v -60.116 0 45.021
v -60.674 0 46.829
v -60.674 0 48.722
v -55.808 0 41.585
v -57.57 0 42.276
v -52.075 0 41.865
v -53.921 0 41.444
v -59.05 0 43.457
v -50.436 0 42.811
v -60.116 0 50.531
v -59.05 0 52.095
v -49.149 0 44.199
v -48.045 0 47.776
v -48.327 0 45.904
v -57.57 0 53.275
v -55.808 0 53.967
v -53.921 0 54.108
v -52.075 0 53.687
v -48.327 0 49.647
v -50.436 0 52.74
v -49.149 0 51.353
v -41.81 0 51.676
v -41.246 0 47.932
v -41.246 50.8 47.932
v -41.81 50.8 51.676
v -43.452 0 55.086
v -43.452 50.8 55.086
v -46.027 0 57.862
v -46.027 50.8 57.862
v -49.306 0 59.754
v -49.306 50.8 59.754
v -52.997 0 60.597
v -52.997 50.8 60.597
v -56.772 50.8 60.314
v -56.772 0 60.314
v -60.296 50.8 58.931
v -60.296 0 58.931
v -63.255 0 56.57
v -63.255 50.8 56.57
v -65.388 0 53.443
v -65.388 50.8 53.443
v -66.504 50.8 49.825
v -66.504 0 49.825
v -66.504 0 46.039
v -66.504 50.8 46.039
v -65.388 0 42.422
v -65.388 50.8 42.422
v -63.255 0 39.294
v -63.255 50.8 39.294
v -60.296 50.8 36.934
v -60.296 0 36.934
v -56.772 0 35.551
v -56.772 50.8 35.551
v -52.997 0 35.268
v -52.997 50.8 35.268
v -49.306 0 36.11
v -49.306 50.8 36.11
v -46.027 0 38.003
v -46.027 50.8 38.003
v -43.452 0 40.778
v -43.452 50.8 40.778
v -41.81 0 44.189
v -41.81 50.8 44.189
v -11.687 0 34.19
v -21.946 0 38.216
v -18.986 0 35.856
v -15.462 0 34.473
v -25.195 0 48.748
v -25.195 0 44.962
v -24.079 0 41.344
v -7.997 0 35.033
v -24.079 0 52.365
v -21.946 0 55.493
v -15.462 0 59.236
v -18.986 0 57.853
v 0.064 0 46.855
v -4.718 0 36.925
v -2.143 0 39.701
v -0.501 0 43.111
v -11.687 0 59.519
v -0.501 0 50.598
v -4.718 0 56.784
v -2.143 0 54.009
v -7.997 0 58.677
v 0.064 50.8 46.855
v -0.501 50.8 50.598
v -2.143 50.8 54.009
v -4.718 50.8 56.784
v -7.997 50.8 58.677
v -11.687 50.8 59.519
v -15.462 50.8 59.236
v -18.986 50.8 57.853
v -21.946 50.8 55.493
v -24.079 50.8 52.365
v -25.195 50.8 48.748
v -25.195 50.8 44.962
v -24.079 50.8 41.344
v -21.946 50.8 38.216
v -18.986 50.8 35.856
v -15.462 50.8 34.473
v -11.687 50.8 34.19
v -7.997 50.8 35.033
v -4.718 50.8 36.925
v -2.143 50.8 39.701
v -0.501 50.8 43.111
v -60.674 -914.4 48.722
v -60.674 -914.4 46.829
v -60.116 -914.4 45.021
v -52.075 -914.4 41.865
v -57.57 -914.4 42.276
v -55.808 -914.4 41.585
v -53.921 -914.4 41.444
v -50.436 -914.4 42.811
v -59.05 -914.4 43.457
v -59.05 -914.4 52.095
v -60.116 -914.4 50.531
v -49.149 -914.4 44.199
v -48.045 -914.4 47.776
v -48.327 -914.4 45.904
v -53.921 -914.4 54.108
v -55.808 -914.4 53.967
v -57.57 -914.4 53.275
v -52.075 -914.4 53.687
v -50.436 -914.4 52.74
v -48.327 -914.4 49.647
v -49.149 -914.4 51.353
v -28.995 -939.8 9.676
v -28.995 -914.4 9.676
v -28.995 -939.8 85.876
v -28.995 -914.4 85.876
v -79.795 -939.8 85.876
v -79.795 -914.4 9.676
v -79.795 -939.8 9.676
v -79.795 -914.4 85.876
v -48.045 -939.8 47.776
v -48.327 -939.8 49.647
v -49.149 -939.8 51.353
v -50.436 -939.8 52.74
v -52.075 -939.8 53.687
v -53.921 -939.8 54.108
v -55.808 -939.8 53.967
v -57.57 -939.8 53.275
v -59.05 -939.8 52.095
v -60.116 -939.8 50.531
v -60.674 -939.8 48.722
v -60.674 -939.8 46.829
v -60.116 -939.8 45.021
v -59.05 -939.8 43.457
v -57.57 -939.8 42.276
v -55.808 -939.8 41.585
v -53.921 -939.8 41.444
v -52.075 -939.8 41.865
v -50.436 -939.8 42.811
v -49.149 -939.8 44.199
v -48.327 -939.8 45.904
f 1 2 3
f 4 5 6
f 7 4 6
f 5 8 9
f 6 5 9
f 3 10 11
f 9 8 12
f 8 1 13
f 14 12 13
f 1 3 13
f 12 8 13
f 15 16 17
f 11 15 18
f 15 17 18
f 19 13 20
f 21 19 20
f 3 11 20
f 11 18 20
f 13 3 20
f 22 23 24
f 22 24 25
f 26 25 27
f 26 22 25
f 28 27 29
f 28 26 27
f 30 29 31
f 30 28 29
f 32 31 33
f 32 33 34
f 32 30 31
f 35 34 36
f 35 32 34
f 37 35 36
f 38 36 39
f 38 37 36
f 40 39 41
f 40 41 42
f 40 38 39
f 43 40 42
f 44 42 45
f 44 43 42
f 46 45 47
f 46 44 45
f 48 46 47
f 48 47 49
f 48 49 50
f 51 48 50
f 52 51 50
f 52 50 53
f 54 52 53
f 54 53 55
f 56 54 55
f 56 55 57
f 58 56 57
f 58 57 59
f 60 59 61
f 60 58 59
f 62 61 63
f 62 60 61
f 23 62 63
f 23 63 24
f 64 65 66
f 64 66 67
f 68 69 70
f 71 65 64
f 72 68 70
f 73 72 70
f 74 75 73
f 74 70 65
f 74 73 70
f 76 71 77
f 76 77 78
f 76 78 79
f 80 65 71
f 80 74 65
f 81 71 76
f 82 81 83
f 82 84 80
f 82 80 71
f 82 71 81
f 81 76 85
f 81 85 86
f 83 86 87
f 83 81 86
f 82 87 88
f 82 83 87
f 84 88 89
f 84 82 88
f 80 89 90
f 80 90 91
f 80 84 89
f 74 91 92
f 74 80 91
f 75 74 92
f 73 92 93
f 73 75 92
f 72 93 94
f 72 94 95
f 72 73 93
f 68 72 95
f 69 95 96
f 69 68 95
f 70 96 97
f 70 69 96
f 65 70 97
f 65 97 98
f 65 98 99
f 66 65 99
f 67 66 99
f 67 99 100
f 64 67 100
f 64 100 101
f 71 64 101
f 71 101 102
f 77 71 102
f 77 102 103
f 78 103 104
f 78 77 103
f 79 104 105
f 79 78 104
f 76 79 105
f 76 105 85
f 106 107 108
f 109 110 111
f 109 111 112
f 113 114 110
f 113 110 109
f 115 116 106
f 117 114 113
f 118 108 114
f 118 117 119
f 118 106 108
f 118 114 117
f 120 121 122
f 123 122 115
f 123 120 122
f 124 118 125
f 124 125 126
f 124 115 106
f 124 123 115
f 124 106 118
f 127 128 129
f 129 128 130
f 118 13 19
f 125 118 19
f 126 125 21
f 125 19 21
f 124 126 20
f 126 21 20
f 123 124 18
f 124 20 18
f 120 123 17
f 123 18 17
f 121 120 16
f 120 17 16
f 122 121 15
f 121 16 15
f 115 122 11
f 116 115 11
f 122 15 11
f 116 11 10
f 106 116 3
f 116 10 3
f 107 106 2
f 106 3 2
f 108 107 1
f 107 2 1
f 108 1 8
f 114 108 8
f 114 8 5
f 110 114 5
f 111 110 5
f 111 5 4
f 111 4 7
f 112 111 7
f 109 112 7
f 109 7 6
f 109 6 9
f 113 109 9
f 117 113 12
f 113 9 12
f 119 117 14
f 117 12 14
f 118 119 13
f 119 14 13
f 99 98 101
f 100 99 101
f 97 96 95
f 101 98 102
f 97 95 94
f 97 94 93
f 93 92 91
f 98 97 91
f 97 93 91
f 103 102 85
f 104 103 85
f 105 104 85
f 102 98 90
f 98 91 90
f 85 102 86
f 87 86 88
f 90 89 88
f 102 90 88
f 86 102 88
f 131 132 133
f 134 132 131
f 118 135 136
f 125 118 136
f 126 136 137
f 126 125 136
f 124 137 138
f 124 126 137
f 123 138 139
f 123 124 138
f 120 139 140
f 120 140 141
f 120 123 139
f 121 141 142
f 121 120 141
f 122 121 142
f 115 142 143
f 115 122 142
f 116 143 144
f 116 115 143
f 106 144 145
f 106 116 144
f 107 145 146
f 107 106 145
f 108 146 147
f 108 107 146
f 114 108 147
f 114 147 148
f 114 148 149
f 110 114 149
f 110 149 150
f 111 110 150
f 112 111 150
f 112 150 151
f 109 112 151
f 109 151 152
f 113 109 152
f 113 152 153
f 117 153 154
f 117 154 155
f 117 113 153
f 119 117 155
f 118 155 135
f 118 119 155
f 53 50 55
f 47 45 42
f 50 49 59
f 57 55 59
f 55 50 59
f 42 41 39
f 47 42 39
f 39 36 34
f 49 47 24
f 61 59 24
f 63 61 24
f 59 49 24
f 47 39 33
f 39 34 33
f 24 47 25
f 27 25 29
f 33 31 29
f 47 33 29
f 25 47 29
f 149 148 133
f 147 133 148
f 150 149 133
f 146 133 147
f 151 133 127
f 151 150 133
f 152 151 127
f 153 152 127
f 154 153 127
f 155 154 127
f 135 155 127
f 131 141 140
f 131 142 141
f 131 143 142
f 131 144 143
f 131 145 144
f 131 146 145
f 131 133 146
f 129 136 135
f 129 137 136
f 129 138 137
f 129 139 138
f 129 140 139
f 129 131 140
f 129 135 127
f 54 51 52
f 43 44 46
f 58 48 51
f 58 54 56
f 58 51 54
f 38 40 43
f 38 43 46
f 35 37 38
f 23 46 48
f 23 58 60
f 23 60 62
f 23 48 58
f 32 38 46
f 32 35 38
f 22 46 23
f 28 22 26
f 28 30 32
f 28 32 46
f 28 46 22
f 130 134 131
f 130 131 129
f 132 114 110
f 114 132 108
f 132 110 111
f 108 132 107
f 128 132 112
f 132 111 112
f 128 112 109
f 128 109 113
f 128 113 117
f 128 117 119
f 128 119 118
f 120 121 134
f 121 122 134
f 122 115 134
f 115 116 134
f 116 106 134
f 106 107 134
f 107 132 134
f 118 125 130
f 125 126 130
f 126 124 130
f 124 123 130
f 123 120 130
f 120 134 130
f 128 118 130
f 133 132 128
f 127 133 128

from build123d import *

# Parameters (mm, degrees)
F0_R     = 12.7
F1_DEPTH = 50.8
F2_R     = 6.35
F3_DEPTH = 914.4
F4_W     = 50.8
F4_H     = 76.2
F4_R     = 6.35
F5_DEPTH = 25.4


with BuildPart() as f1:
    # F0 (on Front) → F1 (new body)
    with BuildSketch(Plane.XZ):
        with Locations((-53.9455996944, 47.9323024082)):
            Circle(F0_R)
    extrude(amount=-F1_DEPTH)


with BuildPart() as f1b:
    # F0 (on Front) → F1, piece 2 (new body)
    with BuildSketch(Plane.XZ):
        with Locations((-12.6364087513, 46.8546705113)):
            Circle(F0_R)
    extrude(amount=-F1_DEPTH)


with BuildPart() as f3:
    # F2 (on Front) → F3 (new body)
    with BuildSketch(Plane.XZ):
        with Locations((-54.395288229, 47.7757565677)):
            Circle(F2_R)
    extrude(amount=F3_DEPTH)


with BuildPart() as f3b:
    # F2 (on Front) → F3, piece 2 (new body)
    with BuildSketch(Plane.XZ):
        with Locations((-12.663452886, 46.6245338321)):
            Circle(F2_R)
    extrude(amount=F3_DEPTH)


with BuildPart() as f5:
    # F4 (on face) → F5 (new body)
    with BuildSketch(Plane.XZ.offset(914.4)):
        with Locations((-54.395288229, 47.7757565677)):
            Rectangle(F4_W, F4_H)
        with Locations((-54.395288229, 47.7757565677)):
            Circle(F4_R, mode=Mode.SUBTRACT)
    extrude(amount=F5_DEPTH)


solid = Compound([f1.part, f1b.part, f3.part, f5.part])
